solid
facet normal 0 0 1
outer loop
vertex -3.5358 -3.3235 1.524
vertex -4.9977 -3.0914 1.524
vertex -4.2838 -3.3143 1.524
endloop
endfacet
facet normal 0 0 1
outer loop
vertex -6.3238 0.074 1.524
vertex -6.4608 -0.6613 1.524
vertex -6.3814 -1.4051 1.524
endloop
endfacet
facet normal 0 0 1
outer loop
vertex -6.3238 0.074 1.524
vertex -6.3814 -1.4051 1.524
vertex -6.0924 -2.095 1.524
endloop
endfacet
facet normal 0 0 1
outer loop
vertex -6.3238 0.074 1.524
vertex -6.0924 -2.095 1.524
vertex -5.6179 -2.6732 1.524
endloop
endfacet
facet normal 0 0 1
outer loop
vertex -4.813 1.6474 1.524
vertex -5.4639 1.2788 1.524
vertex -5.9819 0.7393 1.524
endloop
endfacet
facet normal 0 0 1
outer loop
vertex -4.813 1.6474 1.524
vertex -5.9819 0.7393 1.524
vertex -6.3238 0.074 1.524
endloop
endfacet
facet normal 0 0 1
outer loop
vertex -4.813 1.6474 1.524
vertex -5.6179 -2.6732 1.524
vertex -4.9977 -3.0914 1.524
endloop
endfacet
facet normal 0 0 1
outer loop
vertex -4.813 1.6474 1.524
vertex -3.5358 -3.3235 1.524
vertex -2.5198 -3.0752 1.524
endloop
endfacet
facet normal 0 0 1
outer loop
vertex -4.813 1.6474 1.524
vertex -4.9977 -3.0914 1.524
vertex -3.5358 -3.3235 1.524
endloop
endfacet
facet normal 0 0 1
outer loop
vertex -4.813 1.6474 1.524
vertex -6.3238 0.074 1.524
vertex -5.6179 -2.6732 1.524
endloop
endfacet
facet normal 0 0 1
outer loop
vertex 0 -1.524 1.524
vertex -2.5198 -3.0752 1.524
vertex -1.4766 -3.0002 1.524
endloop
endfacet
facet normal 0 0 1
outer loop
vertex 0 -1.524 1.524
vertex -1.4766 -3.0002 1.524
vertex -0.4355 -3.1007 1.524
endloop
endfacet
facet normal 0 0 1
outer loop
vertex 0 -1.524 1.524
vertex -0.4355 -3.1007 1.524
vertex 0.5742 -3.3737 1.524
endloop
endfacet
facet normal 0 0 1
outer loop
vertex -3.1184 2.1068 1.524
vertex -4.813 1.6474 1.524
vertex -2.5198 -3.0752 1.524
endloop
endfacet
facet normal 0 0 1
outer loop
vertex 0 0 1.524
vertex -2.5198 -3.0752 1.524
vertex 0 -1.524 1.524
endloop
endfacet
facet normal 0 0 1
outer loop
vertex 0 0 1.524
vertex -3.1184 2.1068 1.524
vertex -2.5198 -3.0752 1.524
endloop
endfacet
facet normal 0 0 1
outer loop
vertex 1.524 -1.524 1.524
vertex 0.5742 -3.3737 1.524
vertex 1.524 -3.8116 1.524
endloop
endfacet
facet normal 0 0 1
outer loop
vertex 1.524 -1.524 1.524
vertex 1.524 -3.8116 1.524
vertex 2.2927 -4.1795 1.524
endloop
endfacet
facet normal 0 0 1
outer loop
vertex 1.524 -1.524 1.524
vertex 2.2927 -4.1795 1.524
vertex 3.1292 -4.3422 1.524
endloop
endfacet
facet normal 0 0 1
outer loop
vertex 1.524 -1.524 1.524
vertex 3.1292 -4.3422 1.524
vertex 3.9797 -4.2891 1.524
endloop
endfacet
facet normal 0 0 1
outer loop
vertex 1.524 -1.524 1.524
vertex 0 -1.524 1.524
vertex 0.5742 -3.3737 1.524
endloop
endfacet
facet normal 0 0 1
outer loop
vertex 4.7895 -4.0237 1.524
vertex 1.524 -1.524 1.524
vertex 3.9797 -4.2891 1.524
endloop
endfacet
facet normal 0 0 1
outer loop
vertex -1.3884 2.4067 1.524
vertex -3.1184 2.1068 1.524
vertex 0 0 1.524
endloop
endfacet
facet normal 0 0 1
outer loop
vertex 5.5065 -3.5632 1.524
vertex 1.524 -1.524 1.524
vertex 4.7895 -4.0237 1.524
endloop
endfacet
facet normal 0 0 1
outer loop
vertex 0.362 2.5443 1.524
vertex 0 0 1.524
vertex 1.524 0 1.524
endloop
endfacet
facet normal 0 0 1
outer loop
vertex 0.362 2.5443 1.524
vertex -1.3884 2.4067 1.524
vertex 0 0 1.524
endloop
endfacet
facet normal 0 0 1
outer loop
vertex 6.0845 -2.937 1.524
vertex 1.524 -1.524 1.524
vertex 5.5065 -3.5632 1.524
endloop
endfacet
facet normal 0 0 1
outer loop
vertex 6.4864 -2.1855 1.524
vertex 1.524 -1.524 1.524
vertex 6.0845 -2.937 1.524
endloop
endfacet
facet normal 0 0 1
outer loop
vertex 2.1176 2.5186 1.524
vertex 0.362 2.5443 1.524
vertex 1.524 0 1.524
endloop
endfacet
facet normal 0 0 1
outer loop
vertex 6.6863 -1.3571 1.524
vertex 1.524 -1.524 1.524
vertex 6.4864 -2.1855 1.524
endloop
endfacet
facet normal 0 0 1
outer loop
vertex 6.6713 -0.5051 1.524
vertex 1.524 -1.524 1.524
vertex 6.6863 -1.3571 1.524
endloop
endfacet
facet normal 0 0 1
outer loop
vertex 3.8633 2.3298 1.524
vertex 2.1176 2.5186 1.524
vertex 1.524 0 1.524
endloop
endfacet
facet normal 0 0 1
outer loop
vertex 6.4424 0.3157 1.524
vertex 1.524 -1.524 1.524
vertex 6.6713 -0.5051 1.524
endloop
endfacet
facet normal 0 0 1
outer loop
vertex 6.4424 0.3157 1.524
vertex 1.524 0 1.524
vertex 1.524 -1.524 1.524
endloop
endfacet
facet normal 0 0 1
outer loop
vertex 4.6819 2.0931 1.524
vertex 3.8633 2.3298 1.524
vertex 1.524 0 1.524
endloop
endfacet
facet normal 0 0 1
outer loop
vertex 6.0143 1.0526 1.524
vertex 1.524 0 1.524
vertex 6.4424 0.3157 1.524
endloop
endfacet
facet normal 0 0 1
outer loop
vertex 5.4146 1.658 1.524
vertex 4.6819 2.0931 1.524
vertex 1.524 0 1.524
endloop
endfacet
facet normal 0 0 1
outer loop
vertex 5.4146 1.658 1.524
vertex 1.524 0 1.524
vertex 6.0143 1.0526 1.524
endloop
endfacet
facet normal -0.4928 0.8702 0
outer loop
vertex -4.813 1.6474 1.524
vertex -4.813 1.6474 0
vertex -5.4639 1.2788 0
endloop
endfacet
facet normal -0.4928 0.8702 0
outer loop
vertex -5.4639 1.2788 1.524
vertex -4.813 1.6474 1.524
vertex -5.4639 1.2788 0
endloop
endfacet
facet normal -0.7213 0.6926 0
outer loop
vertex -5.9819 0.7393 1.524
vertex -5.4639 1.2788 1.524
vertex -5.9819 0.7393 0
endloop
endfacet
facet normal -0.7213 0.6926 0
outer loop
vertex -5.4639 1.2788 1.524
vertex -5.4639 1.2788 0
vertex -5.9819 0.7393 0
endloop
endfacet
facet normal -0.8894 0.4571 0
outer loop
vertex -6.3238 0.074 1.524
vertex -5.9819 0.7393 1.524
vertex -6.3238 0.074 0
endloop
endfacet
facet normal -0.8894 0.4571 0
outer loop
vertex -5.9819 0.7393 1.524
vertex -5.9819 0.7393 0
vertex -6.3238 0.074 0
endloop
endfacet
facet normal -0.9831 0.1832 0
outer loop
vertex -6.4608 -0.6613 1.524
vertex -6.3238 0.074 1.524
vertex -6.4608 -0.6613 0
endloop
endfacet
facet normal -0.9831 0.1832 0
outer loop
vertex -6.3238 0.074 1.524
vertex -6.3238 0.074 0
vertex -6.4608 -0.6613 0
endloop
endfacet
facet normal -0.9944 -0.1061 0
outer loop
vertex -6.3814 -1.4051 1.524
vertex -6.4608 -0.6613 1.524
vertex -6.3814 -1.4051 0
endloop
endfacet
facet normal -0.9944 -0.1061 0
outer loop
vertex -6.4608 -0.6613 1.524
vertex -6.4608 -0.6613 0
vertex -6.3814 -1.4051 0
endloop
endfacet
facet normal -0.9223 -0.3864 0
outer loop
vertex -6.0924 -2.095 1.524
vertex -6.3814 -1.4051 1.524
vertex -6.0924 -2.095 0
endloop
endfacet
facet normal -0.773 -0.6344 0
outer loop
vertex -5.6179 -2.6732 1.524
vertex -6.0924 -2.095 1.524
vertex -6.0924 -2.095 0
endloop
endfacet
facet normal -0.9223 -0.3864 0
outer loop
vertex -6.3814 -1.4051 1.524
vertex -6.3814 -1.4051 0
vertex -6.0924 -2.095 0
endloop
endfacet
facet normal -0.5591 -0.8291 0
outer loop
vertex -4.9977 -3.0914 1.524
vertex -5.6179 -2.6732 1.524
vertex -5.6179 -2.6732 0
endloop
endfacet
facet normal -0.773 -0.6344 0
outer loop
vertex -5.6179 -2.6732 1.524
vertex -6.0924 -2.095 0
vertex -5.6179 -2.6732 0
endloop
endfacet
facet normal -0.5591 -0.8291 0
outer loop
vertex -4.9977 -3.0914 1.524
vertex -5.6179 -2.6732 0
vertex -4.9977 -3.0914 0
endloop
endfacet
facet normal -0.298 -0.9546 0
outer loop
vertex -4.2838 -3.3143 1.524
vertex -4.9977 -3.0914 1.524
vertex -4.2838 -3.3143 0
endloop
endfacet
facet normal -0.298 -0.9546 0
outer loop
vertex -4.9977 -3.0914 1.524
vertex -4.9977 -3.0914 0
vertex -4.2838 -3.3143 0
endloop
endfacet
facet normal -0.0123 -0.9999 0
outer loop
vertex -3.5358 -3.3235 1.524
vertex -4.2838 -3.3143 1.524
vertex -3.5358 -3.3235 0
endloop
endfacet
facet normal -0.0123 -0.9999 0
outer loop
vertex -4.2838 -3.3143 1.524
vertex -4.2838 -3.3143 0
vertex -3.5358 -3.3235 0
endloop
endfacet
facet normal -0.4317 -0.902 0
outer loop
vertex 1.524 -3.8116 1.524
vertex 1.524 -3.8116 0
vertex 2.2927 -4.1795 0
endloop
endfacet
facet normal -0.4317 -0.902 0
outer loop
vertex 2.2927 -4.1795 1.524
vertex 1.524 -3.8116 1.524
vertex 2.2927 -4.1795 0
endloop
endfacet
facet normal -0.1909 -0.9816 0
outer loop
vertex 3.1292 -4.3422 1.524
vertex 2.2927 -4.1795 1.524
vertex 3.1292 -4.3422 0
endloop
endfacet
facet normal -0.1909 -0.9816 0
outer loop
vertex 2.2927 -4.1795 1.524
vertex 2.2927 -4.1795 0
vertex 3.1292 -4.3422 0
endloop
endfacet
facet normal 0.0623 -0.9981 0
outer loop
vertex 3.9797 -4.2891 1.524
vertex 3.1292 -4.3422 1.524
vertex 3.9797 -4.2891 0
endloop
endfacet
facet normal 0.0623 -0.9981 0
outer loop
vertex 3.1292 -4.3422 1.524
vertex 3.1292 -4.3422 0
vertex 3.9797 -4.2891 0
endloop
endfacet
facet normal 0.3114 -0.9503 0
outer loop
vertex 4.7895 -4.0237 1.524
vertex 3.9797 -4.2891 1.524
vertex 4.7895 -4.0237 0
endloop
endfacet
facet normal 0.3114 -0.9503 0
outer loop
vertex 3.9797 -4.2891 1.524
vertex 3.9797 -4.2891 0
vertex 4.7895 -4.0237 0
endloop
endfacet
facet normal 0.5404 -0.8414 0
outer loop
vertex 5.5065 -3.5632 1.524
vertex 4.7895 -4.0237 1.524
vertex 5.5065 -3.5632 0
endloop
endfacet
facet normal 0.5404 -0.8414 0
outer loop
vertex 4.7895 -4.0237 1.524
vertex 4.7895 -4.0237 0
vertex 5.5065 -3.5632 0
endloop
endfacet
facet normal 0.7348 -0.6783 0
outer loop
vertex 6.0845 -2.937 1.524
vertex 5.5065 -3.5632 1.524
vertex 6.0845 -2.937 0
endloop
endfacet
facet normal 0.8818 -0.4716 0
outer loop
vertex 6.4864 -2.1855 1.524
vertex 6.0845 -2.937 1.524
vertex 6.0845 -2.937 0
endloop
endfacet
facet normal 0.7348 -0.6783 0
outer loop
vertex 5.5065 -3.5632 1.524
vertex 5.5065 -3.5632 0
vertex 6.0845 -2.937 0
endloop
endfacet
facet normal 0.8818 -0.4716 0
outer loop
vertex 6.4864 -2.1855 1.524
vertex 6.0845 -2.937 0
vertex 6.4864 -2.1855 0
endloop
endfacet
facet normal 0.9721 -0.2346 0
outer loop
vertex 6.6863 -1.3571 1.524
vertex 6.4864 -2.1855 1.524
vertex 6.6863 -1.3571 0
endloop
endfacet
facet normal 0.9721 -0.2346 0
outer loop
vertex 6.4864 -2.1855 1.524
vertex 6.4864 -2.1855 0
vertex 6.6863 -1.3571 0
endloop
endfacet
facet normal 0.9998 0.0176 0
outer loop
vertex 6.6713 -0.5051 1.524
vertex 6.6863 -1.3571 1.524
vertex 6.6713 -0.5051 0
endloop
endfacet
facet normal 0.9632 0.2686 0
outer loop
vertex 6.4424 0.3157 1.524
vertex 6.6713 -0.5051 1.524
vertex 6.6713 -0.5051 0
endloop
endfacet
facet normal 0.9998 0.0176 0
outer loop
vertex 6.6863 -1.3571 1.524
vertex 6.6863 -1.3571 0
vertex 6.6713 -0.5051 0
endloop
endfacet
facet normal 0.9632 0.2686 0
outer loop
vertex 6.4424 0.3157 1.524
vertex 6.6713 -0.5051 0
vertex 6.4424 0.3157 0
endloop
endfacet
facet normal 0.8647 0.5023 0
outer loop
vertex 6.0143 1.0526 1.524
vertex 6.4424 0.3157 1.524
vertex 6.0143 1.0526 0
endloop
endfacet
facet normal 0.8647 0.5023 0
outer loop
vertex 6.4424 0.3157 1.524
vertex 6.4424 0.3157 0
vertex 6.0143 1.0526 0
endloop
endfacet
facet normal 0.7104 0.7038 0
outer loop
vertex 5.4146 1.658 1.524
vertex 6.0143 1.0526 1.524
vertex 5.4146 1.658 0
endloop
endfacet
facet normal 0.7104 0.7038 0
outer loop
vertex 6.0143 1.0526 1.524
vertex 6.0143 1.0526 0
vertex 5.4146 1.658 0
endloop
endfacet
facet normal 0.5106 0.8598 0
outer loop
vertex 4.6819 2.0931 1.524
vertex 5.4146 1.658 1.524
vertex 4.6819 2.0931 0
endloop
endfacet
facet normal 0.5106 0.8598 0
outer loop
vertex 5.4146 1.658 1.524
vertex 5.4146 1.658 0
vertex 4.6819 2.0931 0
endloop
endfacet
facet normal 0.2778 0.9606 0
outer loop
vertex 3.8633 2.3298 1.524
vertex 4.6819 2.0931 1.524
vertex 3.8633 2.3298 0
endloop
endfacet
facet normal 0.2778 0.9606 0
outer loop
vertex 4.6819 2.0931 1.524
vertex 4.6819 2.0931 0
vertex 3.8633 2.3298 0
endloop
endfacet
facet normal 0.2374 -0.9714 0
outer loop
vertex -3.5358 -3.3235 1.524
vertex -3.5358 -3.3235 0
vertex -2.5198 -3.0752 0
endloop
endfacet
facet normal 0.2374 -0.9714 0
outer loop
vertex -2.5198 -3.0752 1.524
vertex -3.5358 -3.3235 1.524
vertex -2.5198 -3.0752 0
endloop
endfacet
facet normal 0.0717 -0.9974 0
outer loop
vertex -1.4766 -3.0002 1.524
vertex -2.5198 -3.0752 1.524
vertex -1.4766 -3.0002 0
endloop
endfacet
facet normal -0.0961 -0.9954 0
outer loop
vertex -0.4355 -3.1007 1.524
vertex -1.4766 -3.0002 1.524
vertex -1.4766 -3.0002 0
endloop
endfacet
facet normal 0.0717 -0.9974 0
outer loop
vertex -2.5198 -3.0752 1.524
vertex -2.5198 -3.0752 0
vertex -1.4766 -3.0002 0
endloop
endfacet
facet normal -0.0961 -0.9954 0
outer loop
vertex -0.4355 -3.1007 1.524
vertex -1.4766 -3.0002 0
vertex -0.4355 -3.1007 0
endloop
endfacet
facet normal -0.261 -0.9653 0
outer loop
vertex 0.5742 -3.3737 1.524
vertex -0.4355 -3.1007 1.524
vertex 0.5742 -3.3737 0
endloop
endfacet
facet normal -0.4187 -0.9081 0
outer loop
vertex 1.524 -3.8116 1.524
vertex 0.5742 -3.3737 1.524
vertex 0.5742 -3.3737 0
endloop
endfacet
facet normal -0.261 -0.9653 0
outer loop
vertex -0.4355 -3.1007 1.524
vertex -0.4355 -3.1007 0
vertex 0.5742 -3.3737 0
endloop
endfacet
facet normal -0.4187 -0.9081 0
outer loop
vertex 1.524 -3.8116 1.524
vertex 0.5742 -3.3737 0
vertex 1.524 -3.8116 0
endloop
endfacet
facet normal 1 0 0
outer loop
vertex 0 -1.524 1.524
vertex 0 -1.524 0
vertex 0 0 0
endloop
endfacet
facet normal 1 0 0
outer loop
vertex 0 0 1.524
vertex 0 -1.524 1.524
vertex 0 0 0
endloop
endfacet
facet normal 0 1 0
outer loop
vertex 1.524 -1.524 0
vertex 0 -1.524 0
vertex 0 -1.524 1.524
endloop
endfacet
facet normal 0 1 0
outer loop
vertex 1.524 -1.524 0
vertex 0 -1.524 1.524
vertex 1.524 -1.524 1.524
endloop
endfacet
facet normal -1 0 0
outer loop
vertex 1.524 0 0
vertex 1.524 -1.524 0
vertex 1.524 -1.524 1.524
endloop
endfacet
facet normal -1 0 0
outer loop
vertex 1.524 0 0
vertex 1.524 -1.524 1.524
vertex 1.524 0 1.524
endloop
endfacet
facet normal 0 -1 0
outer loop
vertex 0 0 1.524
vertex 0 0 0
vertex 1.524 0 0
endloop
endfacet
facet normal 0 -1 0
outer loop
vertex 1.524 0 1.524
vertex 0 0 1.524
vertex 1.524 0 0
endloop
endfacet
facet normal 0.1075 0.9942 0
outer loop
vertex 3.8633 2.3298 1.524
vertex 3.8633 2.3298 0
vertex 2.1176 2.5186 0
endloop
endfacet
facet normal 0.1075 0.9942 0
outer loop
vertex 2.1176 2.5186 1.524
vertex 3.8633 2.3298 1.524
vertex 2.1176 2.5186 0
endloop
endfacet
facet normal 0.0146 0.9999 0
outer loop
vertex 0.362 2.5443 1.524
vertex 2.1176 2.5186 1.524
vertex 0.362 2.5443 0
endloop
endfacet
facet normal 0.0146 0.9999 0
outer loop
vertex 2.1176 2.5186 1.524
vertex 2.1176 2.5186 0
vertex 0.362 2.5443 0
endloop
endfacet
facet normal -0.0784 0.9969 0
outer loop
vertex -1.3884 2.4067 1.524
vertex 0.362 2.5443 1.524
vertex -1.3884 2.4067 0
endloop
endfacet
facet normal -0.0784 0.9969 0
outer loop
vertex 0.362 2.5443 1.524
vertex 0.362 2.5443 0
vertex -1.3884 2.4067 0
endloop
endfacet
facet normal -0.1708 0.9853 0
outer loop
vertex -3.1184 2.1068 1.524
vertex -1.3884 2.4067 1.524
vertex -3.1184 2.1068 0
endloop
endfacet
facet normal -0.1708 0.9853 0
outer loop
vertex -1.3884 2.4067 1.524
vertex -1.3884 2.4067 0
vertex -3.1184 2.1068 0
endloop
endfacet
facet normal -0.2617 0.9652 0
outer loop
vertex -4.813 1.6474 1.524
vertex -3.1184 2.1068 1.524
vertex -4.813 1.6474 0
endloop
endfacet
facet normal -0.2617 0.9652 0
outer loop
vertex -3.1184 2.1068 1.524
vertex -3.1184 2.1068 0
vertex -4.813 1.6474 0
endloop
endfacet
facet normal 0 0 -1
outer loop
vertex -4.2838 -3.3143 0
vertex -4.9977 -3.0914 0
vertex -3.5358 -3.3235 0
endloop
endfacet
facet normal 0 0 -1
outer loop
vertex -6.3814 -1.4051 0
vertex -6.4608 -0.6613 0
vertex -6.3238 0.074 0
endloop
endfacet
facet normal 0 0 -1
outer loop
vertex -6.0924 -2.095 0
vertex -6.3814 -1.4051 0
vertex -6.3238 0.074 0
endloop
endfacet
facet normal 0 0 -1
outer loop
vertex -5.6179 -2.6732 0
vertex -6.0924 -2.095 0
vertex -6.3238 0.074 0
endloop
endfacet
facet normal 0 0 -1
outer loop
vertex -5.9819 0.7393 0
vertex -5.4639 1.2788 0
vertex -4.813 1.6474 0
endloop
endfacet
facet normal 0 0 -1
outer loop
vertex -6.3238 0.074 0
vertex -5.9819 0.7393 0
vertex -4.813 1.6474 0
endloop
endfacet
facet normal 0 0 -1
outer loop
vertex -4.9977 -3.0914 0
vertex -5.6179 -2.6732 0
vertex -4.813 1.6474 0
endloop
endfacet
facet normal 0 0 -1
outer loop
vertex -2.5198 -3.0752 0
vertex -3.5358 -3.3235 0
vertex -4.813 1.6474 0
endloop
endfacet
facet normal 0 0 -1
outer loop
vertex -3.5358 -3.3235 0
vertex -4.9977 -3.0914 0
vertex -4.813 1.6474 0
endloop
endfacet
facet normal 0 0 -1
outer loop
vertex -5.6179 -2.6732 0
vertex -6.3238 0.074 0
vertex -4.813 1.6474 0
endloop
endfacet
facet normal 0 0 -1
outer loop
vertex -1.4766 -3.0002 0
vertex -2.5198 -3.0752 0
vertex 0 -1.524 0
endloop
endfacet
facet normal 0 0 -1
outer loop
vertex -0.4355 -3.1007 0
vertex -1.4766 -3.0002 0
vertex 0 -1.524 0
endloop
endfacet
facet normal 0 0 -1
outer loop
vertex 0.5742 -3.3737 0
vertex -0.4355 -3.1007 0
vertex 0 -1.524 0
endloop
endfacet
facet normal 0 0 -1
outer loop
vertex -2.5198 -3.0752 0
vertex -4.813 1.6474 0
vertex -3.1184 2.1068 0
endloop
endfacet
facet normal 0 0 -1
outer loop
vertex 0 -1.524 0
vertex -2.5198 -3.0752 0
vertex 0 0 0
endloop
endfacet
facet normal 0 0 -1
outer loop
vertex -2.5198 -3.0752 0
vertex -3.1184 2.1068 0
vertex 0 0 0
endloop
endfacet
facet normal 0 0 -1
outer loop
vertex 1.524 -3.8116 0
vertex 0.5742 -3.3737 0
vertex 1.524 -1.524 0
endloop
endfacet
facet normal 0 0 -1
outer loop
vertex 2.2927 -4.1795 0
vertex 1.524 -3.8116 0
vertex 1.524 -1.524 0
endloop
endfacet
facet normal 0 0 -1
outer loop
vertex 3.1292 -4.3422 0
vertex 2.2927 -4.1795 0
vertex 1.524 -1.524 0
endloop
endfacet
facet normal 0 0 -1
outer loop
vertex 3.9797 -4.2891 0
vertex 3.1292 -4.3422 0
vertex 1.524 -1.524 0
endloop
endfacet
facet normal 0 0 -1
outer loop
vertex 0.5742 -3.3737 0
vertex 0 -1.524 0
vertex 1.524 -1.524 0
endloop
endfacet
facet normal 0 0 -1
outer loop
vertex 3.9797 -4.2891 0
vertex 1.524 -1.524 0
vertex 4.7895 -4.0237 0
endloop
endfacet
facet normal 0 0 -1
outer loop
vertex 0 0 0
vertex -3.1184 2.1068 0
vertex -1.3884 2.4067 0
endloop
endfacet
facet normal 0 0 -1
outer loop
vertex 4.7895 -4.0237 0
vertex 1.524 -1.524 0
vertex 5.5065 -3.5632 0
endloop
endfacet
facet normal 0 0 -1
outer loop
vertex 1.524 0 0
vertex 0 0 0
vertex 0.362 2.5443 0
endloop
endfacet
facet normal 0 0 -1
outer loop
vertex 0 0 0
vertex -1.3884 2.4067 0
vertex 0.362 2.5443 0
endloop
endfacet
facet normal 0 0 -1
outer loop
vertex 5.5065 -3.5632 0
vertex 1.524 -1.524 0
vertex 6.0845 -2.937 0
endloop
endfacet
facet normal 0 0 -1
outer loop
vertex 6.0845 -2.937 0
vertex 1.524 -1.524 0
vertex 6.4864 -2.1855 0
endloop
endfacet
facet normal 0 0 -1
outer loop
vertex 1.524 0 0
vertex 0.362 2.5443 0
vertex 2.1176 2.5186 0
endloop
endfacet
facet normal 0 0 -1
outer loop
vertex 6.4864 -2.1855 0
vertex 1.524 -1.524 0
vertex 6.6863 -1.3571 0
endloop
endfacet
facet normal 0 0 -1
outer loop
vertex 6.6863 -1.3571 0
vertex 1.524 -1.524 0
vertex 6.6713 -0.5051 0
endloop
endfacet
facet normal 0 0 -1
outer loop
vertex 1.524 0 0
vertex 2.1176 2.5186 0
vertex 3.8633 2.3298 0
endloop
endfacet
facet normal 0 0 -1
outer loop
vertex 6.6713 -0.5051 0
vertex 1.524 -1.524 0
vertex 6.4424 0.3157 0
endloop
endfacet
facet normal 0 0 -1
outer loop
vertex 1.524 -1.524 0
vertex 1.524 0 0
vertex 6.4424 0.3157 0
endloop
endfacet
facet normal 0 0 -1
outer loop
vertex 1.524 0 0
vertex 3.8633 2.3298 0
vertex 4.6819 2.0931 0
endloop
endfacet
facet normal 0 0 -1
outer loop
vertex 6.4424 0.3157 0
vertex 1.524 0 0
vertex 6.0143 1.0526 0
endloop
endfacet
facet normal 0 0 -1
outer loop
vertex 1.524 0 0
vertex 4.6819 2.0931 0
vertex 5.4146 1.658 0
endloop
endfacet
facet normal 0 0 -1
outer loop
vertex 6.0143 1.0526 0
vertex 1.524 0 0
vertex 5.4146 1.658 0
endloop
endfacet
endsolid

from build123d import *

# Parameters (mm, degrees)
SKETCH1_W           = 1.524
SKETCH1_H           = 1.524
BOSS_EXTRUDE1_DEPTH = 1.524


with BuildPart() as part:
    # Sketch1 → Boss-Extrude1 (new body)
    with BuildSketch(Plane.XY):
        with BuildLine():
            ThreePointArc((-4.813018271, 1.647414383), (-6.381436297, -1.405112195), (-3.535820464, -3.323529288))
            ThreePointArc((-3.535820464, -3.323529288), (-0.953914357, -3.028591374), (1.524, -3.811641797))
            ThreePointArc((1.524, -3.811641797), (6.486387953, -2.185545764), (3.86325293, 2.329832974))
            ThreePointArc((3.86325293, 2.329832974), (-0.514779052, 2.495866349), (-4.813018271, 1.647414383))
        make_face()
        with Locations((0.762, -0.762)):
            Rectangle(SKETCH1_W, SKETCH1_H, mode=Mode.SUBTRACT)
    extrude(amount=BOSS_EXTRUDE1_DEPTH)


solid = part.part
